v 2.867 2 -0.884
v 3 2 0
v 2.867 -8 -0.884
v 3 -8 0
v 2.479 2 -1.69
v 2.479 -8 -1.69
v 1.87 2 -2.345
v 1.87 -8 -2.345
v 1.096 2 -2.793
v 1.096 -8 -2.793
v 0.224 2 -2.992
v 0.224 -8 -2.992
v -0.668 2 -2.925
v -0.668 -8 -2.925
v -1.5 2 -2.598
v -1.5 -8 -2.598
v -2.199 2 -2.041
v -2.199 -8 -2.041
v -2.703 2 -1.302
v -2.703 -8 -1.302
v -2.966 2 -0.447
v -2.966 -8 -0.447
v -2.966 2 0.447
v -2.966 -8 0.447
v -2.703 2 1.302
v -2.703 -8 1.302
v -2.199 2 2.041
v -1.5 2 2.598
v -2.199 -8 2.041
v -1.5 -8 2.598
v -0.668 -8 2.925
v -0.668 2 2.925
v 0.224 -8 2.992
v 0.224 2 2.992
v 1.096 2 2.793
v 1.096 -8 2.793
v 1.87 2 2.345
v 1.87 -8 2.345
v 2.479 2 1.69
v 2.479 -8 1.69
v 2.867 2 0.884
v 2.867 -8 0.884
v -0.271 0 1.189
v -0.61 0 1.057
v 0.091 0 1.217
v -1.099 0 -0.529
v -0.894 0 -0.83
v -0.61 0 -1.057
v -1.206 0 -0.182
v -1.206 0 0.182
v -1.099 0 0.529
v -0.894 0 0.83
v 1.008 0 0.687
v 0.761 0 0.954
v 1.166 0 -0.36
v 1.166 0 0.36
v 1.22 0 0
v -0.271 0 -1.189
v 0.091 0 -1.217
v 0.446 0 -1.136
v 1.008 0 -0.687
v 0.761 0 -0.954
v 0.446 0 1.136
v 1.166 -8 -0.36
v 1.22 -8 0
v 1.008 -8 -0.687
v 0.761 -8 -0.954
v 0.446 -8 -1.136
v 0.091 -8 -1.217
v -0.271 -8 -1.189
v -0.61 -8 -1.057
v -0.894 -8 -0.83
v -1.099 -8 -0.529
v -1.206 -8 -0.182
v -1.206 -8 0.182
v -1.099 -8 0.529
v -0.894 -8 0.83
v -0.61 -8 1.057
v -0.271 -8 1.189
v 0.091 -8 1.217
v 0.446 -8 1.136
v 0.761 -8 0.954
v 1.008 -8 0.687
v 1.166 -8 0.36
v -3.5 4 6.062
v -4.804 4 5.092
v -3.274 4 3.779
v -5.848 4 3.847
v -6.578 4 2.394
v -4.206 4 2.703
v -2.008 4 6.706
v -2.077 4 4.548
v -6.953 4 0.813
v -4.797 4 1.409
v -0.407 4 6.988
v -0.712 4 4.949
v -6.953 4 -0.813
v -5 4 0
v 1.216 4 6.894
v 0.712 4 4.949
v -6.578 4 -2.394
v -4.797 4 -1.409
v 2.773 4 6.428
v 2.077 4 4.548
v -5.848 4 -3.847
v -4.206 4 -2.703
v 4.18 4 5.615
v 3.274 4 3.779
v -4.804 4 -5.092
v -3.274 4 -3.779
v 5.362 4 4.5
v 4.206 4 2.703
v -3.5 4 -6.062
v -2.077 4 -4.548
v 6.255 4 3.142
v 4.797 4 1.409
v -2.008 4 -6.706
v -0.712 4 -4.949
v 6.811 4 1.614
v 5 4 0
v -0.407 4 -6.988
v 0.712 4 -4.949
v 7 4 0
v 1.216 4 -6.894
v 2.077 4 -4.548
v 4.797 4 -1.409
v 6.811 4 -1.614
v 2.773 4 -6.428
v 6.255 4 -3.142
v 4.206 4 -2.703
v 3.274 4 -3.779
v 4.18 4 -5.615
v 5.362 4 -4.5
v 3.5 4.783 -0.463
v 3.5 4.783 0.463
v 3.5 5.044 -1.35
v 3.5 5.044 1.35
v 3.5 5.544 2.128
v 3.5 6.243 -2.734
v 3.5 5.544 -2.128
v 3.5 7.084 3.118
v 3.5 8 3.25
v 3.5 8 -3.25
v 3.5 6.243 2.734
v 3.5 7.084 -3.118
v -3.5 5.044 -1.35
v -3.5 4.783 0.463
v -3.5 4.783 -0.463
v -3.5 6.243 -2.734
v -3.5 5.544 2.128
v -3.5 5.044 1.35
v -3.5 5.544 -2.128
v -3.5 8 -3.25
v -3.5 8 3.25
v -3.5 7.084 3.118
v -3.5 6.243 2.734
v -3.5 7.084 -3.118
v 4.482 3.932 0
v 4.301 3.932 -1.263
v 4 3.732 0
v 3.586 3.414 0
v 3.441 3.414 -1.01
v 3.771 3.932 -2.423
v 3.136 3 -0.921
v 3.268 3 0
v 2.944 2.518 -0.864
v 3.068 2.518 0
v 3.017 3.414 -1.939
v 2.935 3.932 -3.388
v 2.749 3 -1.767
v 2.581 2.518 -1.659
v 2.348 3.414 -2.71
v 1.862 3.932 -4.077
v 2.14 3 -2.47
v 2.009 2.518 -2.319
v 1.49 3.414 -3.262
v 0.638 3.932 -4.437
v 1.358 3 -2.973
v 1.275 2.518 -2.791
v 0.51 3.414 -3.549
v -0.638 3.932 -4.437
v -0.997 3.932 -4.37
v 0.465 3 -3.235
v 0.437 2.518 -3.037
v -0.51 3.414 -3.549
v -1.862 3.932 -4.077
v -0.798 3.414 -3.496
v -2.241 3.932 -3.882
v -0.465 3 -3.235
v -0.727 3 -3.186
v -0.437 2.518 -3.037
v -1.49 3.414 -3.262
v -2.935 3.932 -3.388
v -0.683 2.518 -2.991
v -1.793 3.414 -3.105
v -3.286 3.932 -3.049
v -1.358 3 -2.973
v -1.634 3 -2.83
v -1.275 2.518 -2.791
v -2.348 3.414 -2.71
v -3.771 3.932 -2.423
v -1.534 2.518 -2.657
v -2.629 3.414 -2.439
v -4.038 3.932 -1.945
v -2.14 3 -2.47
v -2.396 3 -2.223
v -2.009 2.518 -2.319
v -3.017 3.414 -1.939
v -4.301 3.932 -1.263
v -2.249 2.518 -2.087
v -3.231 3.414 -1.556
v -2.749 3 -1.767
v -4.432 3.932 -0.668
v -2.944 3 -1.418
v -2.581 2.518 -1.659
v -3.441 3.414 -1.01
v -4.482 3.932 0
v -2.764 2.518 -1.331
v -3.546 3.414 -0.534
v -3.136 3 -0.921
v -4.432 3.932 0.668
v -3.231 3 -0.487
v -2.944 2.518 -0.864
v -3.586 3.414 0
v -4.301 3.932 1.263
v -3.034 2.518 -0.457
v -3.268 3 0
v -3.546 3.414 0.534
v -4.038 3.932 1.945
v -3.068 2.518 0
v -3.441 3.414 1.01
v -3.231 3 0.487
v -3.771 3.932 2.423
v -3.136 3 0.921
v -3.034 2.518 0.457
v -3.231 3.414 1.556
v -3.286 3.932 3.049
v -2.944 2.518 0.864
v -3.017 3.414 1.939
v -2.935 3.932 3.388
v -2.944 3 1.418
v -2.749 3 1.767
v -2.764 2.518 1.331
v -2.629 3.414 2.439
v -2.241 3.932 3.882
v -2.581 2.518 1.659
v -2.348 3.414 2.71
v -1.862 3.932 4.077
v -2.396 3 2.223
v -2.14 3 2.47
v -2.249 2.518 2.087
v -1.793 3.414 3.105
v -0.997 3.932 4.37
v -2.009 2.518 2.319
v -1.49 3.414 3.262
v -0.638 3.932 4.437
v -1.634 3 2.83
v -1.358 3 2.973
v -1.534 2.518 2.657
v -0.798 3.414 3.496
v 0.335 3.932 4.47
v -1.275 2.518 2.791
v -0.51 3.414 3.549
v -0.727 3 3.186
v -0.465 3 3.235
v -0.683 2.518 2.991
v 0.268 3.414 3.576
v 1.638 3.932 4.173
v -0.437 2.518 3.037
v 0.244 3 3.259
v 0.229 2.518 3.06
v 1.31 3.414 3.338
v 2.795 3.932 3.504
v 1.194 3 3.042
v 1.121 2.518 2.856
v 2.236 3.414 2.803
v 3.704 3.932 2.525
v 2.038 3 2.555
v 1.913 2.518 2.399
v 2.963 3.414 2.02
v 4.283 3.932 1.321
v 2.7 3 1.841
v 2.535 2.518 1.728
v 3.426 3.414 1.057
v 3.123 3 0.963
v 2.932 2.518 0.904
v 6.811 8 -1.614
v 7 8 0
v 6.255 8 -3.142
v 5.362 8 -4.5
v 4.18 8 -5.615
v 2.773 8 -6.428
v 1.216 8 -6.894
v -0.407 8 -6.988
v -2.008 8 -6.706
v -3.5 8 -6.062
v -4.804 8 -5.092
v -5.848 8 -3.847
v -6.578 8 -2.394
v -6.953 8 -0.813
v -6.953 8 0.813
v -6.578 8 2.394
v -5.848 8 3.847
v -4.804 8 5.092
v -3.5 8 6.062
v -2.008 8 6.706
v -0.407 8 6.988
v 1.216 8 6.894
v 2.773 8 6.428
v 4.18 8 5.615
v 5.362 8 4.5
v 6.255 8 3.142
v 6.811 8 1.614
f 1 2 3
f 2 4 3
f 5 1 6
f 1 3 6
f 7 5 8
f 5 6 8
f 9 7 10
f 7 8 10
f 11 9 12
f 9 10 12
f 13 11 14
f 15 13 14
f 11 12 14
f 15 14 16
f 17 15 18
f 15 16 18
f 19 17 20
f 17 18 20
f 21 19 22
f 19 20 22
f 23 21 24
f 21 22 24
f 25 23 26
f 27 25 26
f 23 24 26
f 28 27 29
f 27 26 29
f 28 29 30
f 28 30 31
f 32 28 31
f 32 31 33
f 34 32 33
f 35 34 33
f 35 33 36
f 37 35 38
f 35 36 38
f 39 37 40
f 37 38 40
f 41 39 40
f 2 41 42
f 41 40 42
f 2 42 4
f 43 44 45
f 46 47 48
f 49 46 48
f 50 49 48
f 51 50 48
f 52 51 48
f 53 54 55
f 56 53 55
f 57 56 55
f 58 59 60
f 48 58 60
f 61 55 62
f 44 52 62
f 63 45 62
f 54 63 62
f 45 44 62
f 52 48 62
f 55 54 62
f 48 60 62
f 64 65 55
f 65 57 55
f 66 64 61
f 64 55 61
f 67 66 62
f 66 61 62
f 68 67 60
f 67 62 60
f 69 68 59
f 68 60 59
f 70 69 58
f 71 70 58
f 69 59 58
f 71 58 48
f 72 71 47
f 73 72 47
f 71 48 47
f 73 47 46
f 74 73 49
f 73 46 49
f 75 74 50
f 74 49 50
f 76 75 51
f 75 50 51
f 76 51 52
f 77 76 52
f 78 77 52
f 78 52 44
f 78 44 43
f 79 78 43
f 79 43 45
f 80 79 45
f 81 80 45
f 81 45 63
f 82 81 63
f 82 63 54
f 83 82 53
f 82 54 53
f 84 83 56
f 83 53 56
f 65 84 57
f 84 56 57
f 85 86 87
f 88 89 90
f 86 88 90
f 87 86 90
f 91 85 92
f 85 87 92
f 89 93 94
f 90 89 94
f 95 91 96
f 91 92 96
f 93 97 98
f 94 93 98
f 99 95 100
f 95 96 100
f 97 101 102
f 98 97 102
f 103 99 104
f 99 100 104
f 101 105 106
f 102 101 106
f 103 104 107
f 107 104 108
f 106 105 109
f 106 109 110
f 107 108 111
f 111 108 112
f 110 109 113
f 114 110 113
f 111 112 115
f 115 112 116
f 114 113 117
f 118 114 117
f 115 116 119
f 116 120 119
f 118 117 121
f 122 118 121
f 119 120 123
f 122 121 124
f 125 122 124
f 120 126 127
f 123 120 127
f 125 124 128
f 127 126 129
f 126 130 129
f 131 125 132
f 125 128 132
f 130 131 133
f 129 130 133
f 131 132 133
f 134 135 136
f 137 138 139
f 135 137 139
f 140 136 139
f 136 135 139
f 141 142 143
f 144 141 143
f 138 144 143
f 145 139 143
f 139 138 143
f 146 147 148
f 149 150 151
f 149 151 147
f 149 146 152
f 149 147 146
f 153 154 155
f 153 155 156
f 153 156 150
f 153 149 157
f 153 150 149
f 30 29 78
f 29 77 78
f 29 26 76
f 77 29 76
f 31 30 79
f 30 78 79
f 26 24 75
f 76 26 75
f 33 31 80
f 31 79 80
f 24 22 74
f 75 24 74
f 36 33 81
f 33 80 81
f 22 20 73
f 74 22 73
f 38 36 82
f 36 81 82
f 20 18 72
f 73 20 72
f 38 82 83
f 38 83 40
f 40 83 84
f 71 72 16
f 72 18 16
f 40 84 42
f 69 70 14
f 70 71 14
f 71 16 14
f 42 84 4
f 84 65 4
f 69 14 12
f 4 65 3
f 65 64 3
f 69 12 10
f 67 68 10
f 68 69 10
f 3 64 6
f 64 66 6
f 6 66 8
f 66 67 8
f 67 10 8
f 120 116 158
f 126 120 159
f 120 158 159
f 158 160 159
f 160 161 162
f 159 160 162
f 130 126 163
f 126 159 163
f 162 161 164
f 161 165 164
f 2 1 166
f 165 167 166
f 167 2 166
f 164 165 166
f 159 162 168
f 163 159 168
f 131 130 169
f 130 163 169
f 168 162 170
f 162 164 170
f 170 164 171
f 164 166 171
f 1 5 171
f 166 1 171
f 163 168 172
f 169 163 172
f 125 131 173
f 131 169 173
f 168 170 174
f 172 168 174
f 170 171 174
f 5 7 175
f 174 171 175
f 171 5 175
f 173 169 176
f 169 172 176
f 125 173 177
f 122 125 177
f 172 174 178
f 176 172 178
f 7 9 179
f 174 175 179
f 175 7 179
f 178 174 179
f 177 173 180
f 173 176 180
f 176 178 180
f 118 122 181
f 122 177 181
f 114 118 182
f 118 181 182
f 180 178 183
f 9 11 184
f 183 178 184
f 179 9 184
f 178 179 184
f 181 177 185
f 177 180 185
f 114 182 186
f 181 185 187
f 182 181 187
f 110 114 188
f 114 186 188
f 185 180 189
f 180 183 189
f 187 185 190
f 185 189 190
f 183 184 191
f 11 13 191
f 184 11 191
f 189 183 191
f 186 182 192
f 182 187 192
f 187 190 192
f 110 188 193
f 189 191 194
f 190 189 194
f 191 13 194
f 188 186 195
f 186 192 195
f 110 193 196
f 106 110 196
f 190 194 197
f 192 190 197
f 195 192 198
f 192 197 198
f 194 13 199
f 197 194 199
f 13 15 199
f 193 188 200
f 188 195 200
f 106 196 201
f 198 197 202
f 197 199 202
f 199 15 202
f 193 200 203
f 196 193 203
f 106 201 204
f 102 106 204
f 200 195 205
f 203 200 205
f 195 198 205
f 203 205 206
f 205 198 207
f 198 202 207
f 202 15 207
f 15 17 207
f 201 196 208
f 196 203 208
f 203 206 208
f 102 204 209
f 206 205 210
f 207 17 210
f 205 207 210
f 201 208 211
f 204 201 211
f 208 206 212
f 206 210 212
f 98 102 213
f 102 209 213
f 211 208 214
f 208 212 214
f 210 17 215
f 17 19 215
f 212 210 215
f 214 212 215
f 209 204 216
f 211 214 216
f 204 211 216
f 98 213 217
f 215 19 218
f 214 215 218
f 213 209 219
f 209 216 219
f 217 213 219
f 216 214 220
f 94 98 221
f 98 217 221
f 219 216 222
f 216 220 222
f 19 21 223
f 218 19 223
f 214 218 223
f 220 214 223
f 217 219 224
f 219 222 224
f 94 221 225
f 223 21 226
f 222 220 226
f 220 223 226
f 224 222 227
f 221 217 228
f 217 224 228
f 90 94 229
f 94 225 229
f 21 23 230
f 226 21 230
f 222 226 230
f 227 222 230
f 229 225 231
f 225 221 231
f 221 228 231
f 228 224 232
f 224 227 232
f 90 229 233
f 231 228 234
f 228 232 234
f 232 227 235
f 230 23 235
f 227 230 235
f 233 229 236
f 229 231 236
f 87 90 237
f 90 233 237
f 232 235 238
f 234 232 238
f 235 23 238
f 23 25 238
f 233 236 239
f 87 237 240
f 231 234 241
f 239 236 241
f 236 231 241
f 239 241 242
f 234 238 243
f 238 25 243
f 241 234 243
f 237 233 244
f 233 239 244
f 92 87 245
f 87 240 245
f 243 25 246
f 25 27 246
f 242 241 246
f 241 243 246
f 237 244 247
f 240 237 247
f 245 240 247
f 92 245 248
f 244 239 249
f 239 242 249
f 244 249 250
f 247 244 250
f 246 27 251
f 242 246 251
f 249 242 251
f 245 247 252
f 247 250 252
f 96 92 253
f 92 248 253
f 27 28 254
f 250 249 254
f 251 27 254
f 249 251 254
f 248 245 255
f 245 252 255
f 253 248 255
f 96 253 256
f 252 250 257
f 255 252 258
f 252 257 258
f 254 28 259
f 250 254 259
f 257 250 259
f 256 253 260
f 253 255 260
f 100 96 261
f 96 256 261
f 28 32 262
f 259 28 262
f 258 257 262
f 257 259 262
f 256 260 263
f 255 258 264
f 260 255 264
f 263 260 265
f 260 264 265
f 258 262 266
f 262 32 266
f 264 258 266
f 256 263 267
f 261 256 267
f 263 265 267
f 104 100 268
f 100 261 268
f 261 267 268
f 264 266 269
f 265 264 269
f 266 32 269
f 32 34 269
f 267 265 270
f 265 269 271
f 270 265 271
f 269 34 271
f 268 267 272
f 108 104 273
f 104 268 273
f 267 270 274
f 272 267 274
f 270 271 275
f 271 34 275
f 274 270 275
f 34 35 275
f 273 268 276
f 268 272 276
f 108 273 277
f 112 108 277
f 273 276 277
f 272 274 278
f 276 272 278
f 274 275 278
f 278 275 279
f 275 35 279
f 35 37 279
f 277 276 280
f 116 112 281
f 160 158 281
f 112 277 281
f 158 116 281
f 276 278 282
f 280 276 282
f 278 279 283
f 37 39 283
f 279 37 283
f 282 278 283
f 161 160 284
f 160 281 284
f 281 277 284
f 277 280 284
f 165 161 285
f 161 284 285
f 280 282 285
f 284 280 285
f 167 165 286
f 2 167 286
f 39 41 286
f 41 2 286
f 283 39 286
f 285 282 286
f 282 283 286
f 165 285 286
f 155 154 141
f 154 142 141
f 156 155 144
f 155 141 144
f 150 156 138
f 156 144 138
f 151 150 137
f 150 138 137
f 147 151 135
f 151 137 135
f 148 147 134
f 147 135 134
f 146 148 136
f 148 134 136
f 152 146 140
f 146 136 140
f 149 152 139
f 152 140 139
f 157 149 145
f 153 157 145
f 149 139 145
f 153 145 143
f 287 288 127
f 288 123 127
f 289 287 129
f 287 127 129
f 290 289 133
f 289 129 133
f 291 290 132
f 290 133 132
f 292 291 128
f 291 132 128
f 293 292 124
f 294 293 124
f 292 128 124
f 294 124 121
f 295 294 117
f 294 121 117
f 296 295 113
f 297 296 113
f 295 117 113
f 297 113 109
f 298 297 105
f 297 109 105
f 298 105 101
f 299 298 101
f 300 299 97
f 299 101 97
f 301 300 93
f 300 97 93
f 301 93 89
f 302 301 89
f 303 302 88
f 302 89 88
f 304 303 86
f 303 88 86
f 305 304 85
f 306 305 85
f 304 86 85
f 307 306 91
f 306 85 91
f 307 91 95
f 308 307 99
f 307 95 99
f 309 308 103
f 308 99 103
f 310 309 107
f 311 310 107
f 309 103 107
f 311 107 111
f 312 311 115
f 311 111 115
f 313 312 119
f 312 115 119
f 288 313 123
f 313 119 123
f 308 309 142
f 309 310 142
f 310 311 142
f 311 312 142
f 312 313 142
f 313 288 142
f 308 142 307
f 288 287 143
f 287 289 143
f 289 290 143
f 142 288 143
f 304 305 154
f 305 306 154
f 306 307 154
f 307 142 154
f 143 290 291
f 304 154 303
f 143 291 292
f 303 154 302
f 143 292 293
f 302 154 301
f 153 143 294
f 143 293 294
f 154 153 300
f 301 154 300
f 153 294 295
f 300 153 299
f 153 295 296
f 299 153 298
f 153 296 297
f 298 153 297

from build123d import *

# Parameters (mm, degrees)
SKETCH_2_R          = 3.25
CUT_EXTRUDE_1_DEPTH = 3.5


with BuildPart() as part:
    # 草图1 → 旋转1 (revolve)
    with BuildSketch(Plane.XY):
        with BuildLine():
            Line((0, 8), (7, 8))
            Line((7, 8), (7, 4))
            Line((7, 4), (5, 4))
            ThreePointArc((5, 4), (3.585786438, 3.414213562), (3, 2))
            Line((3, 2), (3, -8))
            Line((3, -8), (1.22, -8))
            Line((1.22, -8), (1.22, 0))
            Line((1.22, 0), (0, 0))
            Line((0, 0), (0, 8))
        make_face()
    revolve(axis=Axis((0, -147.558866066, 0), (0, 1, 0)))

    # 草图2 → 切除-拉伸1 (cut, symmetric)
    with BuildSketch(Plane(origin=(0, 0, 0), x_dir=(0, 0, -1), z_dir=(1, 0, 0))):
        with Locations((0, 8)):
            Circle(SKETCH_2_R)
    extrude(amount=CUT_EXTRUDE_1_DEPTH, both=True, mode=Mode.SUBTRACT)


solid = part.part
